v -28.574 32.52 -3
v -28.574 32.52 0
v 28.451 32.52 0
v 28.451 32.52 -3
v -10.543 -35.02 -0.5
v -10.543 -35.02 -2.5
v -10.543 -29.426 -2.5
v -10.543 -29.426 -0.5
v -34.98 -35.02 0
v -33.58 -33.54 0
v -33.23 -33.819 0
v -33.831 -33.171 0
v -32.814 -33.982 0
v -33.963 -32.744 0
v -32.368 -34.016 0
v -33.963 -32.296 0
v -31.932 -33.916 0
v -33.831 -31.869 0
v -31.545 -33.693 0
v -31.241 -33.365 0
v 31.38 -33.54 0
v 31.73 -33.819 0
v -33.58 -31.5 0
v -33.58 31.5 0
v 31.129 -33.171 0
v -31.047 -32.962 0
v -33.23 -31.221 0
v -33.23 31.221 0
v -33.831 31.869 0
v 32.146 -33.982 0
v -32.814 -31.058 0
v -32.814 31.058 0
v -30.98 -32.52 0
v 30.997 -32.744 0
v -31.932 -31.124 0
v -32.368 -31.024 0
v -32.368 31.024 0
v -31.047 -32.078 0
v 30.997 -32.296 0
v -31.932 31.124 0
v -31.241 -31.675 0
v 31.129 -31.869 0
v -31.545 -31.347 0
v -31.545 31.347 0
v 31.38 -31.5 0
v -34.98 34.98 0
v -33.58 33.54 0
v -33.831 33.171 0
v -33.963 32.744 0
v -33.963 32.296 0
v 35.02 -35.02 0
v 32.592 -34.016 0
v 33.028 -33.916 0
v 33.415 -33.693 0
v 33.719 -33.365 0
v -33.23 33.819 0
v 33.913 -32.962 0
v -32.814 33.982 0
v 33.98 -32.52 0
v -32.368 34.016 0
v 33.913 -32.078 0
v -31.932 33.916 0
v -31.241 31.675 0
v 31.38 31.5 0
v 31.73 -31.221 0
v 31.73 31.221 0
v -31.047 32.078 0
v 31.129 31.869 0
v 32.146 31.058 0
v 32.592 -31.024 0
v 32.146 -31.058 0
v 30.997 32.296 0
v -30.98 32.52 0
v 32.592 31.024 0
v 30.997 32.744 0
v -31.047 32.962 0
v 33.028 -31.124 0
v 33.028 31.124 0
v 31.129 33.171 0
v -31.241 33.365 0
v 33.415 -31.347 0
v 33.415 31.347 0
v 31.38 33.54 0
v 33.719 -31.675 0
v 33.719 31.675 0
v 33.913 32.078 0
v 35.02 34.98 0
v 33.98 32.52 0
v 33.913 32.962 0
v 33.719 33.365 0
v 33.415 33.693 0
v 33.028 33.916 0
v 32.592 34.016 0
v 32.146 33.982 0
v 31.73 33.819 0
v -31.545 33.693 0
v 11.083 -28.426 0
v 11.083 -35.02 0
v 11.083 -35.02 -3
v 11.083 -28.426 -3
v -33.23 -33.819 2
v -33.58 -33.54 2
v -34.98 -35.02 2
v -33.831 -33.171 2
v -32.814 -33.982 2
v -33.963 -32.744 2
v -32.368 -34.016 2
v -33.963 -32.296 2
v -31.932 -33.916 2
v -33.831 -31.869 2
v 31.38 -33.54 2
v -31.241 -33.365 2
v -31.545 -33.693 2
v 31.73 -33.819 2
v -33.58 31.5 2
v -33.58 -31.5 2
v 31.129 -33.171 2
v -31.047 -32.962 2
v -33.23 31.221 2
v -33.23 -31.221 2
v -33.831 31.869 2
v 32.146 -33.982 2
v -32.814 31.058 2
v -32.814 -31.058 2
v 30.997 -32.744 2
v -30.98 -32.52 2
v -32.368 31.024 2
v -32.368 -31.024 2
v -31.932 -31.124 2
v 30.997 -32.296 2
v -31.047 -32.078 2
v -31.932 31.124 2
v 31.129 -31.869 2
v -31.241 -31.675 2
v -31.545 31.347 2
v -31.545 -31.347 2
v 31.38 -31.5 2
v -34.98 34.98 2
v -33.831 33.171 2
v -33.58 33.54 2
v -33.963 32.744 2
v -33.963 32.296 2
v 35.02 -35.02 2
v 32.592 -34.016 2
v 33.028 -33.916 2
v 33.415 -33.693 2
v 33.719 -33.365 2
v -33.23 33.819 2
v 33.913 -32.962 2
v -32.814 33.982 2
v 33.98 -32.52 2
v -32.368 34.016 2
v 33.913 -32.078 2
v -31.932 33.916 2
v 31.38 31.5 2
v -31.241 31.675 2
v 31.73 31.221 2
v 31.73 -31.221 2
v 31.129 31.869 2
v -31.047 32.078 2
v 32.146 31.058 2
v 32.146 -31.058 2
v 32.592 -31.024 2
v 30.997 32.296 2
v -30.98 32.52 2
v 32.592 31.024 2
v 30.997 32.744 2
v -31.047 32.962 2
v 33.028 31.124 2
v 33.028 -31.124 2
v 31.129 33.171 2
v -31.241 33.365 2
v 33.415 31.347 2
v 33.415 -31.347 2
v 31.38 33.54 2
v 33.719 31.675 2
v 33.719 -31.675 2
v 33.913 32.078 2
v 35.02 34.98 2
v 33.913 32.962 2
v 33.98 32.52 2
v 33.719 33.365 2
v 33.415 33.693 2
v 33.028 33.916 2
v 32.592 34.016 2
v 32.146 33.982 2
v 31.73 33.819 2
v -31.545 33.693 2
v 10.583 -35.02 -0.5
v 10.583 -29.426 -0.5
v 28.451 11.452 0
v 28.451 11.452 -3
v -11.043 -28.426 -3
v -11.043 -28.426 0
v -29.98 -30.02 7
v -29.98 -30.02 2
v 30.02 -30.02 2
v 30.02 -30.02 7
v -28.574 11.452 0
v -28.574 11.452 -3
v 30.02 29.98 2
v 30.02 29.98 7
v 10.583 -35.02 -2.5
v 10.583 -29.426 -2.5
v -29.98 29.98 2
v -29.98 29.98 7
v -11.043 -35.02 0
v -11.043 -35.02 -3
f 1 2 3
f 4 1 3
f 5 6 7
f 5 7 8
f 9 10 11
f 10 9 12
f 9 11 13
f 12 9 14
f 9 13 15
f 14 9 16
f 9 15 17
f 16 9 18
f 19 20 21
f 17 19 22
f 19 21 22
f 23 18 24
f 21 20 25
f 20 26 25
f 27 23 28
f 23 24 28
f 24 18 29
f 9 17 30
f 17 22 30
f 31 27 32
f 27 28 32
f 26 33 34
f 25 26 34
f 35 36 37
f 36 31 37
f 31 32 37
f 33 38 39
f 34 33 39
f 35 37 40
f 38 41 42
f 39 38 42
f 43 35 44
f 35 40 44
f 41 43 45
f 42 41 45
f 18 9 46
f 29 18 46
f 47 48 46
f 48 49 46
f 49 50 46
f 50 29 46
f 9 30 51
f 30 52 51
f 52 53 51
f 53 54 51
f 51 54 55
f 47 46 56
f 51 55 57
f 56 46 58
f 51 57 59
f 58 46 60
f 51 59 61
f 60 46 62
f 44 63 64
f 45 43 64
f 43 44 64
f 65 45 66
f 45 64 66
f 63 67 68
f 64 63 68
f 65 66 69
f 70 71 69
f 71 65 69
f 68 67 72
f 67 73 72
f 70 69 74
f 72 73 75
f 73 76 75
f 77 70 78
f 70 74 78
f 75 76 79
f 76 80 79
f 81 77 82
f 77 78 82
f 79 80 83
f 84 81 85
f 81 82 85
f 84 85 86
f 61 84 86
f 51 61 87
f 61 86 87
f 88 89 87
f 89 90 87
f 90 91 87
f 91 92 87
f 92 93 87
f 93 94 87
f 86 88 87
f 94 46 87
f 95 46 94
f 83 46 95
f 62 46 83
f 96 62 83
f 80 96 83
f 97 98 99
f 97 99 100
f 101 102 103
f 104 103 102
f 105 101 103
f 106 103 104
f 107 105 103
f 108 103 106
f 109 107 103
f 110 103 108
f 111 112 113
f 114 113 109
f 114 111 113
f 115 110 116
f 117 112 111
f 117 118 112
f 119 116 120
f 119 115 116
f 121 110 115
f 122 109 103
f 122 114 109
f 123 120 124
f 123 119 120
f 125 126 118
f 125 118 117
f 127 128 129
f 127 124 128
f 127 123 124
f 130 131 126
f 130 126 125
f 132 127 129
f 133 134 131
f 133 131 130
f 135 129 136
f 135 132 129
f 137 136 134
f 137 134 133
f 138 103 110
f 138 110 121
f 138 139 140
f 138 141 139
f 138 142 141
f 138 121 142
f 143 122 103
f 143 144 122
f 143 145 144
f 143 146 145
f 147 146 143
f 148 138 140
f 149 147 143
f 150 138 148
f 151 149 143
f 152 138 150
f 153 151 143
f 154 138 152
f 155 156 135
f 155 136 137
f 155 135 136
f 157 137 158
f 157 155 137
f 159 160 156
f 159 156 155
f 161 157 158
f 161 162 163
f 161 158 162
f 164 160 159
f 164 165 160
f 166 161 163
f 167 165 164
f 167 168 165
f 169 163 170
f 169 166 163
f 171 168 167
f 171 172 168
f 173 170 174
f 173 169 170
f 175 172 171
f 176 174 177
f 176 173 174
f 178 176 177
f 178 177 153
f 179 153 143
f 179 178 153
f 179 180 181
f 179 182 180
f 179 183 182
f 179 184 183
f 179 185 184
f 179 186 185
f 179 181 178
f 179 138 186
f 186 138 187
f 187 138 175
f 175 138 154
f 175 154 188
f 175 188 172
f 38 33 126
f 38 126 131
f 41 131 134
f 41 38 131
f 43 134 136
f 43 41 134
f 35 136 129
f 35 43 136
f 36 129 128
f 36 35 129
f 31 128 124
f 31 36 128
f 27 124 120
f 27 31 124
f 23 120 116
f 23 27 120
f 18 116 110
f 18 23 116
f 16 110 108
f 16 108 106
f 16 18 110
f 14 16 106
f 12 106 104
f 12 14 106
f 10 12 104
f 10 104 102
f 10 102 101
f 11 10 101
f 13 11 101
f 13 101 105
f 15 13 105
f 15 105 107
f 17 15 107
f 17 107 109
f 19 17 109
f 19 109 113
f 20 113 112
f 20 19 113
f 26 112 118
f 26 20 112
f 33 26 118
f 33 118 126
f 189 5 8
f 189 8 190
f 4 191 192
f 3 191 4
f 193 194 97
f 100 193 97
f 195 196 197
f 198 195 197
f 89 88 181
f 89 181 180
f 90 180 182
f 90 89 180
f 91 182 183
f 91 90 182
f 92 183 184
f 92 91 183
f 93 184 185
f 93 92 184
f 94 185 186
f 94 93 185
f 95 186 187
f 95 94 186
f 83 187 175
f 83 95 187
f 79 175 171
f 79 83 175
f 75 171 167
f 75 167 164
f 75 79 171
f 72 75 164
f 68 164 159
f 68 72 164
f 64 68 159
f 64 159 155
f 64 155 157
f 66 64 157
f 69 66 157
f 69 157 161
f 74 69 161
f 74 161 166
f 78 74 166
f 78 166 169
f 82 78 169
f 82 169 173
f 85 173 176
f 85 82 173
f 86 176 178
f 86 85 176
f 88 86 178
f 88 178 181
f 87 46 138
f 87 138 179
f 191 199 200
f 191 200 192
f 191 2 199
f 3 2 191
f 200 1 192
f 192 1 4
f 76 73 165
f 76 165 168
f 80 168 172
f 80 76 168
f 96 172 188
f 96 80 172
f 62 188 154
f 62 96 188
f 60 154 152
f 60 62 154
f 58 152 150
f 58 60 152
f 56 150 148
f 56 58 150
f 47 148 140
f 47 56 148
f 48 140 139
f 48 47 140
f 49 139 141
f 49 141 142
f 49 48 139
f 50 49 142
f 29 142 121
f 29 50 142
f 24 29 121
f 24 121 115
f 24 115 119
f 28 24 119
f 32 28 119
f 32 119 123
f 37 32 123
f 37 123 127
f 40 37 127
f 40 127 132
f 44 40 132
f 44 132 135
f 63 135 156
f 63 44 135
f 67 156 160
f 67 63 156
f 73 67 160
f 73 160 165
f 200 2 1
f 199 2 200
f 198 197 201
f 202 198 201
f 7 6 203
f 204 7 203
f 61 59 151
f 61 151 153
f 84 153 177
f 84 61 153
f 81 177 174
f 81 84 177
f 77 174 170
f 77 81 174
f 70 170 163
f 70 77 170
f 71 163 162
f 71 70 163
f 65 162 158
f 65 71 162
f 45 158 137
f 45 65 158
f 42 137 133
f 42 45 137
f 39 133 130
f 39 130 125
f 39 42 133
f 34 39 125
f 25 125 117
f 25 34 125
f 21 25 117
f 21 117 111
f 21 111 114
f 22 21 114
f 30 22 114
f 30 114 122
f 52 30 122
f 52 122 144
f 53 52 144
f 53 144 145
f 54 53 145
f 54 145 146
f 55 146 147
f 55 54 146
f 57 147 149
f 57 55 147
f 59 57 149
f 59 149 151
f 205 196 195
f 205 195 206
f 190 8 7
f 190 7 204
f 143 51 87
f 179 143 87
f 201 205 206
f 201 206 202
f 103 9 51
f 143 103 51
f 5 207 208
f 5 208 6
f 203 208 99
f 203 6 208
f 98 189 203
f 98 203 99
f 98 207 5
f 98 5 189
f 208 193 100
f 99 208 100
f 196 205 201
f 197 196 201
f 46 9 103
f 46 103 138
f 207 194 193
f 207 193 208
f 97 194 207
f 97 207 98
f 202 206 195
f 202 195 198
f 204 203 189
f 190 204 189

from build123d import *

# Parameters (mm, degrees)
SKETCH1_W           = 70
SKETCH1_H           = 70
SKETCH1_R           = 1.5
BOSS_EXTRUDE1_DEPTH = 2
SKETCH1_4_W         = 60
SKETCH1_4_H         = 60
BOSS_EXTRUDE4_DEPTH = 7
SKETCH1_5_W         = 22.125679749
SKETCH1_5_H         = 1.593739236
SKETCH1_5_H_2       = 5
SKETCH1_5_W_2       = 57.02588195
SKETCH1_5_H_3       = 2.540060886
SKETCH1_5_H_4       = 18.527616595
BOSS_EXTRUDE5_DEPTH = 3
SKETCH1_6_W         = 60
SKETCH1_6_H         = 60
CUT_EXTRUDE1_DEPTH  = 2
SKETCH4_W           = 21.125679749
SKETCH4_H           = 2
CUT_EXTRUDE2_DEPTH  = 5.593739


with BuildPart() as part:
    # Sketch1 → Boss-Extrude1 (new body)
    with BuildSketch(Plane.XY):
        with Locations((0.020030443, -0.020030443)):
            Rectangle(SKETCH1_W, SKETCH1_H)
        with Locations((-32.479969557, -32.520030443)):
            Circle(SKETCH1_R, mode=Mode.SUBTRACT)
        with Locations((32.479969557, -32.520030443)):
            Circle(SKETCH1_R, mode=Mode.SUBTRACT)
        with Locations((32.479969557, 32.520030443)):
            Circle(SKETCH1_R, mode=Mode.SUBTRACT)
        with Locations((-32.479969557, 32.520030443)):
            Circle(SKETCH1_R, mode=Mode.SUBTRACT)
    extrude(amount=BOSS_EXTRUDE1_DEPTH)


with BuildPart() as body_2:
    # Sketch1<4> → Boss-Extrude4 (new body)
    with BuildSketch(Plane.XY):
        with Locations((0.020030443, -0.020030443)):
            Rectangle(SKETCH1_4_W, SKETCH1_4_H)
    extrude(amount=BOSS_EXTRUDE4_DEPTH)

    # Sketch1<6> → Cut-Extrude1 (cut)
    with BuildSketch(Plane.XY):
        with Locations((0.020030443, -0.020030443)):
            Rectangle(SKETCH1_6_W, SKETCH1_6_H)
    extrude(amount=CUT_EXTRUDE1_DEPTH, mode=Mode.SUBTRACT)


with BuildPart() as body_3:
    # Sketch1<5> → Boss-Extrude5 (new body)
    with BuildSketch(Plane.XY):
        with Locations((0.020030443, -29.223160825)):
            Rectangle(SKETCH1_5_W, SKETCH1_5_H)
        with Locations((0.020030443, -32.520030443)):
            Rectangle(SKETCH1_5_W, SKETCH1_5_H_2)
        with Locations((-0.061531288, 31.25)):
            Rectangle(SKETCH1_5_W_2, SKETCH1_5_H_3)
        with Locations((-0.061531288, 20.71616126)):
            Rectangle(SKETCH1_5_W_2, SKETCH1_5_H_4)
    extrude(amount=-BOSS_EXTRUDE5_DEPTH)

    # Sketch4 → Cut-Extrude2 (cut)
    with BuildSketch(Plane.XZ.offset(35.020030443)):
        with Locations((0.020030443, -1.5)):
            Rectangle(SKETCH4_W, SKETCH4_H)
    extrude(amount=-CUT_EXTRUDE2_DEPTH, mode=Mode.SUBTRACT)


solid = Compound([part.part, body_2.part, body_3.part])
